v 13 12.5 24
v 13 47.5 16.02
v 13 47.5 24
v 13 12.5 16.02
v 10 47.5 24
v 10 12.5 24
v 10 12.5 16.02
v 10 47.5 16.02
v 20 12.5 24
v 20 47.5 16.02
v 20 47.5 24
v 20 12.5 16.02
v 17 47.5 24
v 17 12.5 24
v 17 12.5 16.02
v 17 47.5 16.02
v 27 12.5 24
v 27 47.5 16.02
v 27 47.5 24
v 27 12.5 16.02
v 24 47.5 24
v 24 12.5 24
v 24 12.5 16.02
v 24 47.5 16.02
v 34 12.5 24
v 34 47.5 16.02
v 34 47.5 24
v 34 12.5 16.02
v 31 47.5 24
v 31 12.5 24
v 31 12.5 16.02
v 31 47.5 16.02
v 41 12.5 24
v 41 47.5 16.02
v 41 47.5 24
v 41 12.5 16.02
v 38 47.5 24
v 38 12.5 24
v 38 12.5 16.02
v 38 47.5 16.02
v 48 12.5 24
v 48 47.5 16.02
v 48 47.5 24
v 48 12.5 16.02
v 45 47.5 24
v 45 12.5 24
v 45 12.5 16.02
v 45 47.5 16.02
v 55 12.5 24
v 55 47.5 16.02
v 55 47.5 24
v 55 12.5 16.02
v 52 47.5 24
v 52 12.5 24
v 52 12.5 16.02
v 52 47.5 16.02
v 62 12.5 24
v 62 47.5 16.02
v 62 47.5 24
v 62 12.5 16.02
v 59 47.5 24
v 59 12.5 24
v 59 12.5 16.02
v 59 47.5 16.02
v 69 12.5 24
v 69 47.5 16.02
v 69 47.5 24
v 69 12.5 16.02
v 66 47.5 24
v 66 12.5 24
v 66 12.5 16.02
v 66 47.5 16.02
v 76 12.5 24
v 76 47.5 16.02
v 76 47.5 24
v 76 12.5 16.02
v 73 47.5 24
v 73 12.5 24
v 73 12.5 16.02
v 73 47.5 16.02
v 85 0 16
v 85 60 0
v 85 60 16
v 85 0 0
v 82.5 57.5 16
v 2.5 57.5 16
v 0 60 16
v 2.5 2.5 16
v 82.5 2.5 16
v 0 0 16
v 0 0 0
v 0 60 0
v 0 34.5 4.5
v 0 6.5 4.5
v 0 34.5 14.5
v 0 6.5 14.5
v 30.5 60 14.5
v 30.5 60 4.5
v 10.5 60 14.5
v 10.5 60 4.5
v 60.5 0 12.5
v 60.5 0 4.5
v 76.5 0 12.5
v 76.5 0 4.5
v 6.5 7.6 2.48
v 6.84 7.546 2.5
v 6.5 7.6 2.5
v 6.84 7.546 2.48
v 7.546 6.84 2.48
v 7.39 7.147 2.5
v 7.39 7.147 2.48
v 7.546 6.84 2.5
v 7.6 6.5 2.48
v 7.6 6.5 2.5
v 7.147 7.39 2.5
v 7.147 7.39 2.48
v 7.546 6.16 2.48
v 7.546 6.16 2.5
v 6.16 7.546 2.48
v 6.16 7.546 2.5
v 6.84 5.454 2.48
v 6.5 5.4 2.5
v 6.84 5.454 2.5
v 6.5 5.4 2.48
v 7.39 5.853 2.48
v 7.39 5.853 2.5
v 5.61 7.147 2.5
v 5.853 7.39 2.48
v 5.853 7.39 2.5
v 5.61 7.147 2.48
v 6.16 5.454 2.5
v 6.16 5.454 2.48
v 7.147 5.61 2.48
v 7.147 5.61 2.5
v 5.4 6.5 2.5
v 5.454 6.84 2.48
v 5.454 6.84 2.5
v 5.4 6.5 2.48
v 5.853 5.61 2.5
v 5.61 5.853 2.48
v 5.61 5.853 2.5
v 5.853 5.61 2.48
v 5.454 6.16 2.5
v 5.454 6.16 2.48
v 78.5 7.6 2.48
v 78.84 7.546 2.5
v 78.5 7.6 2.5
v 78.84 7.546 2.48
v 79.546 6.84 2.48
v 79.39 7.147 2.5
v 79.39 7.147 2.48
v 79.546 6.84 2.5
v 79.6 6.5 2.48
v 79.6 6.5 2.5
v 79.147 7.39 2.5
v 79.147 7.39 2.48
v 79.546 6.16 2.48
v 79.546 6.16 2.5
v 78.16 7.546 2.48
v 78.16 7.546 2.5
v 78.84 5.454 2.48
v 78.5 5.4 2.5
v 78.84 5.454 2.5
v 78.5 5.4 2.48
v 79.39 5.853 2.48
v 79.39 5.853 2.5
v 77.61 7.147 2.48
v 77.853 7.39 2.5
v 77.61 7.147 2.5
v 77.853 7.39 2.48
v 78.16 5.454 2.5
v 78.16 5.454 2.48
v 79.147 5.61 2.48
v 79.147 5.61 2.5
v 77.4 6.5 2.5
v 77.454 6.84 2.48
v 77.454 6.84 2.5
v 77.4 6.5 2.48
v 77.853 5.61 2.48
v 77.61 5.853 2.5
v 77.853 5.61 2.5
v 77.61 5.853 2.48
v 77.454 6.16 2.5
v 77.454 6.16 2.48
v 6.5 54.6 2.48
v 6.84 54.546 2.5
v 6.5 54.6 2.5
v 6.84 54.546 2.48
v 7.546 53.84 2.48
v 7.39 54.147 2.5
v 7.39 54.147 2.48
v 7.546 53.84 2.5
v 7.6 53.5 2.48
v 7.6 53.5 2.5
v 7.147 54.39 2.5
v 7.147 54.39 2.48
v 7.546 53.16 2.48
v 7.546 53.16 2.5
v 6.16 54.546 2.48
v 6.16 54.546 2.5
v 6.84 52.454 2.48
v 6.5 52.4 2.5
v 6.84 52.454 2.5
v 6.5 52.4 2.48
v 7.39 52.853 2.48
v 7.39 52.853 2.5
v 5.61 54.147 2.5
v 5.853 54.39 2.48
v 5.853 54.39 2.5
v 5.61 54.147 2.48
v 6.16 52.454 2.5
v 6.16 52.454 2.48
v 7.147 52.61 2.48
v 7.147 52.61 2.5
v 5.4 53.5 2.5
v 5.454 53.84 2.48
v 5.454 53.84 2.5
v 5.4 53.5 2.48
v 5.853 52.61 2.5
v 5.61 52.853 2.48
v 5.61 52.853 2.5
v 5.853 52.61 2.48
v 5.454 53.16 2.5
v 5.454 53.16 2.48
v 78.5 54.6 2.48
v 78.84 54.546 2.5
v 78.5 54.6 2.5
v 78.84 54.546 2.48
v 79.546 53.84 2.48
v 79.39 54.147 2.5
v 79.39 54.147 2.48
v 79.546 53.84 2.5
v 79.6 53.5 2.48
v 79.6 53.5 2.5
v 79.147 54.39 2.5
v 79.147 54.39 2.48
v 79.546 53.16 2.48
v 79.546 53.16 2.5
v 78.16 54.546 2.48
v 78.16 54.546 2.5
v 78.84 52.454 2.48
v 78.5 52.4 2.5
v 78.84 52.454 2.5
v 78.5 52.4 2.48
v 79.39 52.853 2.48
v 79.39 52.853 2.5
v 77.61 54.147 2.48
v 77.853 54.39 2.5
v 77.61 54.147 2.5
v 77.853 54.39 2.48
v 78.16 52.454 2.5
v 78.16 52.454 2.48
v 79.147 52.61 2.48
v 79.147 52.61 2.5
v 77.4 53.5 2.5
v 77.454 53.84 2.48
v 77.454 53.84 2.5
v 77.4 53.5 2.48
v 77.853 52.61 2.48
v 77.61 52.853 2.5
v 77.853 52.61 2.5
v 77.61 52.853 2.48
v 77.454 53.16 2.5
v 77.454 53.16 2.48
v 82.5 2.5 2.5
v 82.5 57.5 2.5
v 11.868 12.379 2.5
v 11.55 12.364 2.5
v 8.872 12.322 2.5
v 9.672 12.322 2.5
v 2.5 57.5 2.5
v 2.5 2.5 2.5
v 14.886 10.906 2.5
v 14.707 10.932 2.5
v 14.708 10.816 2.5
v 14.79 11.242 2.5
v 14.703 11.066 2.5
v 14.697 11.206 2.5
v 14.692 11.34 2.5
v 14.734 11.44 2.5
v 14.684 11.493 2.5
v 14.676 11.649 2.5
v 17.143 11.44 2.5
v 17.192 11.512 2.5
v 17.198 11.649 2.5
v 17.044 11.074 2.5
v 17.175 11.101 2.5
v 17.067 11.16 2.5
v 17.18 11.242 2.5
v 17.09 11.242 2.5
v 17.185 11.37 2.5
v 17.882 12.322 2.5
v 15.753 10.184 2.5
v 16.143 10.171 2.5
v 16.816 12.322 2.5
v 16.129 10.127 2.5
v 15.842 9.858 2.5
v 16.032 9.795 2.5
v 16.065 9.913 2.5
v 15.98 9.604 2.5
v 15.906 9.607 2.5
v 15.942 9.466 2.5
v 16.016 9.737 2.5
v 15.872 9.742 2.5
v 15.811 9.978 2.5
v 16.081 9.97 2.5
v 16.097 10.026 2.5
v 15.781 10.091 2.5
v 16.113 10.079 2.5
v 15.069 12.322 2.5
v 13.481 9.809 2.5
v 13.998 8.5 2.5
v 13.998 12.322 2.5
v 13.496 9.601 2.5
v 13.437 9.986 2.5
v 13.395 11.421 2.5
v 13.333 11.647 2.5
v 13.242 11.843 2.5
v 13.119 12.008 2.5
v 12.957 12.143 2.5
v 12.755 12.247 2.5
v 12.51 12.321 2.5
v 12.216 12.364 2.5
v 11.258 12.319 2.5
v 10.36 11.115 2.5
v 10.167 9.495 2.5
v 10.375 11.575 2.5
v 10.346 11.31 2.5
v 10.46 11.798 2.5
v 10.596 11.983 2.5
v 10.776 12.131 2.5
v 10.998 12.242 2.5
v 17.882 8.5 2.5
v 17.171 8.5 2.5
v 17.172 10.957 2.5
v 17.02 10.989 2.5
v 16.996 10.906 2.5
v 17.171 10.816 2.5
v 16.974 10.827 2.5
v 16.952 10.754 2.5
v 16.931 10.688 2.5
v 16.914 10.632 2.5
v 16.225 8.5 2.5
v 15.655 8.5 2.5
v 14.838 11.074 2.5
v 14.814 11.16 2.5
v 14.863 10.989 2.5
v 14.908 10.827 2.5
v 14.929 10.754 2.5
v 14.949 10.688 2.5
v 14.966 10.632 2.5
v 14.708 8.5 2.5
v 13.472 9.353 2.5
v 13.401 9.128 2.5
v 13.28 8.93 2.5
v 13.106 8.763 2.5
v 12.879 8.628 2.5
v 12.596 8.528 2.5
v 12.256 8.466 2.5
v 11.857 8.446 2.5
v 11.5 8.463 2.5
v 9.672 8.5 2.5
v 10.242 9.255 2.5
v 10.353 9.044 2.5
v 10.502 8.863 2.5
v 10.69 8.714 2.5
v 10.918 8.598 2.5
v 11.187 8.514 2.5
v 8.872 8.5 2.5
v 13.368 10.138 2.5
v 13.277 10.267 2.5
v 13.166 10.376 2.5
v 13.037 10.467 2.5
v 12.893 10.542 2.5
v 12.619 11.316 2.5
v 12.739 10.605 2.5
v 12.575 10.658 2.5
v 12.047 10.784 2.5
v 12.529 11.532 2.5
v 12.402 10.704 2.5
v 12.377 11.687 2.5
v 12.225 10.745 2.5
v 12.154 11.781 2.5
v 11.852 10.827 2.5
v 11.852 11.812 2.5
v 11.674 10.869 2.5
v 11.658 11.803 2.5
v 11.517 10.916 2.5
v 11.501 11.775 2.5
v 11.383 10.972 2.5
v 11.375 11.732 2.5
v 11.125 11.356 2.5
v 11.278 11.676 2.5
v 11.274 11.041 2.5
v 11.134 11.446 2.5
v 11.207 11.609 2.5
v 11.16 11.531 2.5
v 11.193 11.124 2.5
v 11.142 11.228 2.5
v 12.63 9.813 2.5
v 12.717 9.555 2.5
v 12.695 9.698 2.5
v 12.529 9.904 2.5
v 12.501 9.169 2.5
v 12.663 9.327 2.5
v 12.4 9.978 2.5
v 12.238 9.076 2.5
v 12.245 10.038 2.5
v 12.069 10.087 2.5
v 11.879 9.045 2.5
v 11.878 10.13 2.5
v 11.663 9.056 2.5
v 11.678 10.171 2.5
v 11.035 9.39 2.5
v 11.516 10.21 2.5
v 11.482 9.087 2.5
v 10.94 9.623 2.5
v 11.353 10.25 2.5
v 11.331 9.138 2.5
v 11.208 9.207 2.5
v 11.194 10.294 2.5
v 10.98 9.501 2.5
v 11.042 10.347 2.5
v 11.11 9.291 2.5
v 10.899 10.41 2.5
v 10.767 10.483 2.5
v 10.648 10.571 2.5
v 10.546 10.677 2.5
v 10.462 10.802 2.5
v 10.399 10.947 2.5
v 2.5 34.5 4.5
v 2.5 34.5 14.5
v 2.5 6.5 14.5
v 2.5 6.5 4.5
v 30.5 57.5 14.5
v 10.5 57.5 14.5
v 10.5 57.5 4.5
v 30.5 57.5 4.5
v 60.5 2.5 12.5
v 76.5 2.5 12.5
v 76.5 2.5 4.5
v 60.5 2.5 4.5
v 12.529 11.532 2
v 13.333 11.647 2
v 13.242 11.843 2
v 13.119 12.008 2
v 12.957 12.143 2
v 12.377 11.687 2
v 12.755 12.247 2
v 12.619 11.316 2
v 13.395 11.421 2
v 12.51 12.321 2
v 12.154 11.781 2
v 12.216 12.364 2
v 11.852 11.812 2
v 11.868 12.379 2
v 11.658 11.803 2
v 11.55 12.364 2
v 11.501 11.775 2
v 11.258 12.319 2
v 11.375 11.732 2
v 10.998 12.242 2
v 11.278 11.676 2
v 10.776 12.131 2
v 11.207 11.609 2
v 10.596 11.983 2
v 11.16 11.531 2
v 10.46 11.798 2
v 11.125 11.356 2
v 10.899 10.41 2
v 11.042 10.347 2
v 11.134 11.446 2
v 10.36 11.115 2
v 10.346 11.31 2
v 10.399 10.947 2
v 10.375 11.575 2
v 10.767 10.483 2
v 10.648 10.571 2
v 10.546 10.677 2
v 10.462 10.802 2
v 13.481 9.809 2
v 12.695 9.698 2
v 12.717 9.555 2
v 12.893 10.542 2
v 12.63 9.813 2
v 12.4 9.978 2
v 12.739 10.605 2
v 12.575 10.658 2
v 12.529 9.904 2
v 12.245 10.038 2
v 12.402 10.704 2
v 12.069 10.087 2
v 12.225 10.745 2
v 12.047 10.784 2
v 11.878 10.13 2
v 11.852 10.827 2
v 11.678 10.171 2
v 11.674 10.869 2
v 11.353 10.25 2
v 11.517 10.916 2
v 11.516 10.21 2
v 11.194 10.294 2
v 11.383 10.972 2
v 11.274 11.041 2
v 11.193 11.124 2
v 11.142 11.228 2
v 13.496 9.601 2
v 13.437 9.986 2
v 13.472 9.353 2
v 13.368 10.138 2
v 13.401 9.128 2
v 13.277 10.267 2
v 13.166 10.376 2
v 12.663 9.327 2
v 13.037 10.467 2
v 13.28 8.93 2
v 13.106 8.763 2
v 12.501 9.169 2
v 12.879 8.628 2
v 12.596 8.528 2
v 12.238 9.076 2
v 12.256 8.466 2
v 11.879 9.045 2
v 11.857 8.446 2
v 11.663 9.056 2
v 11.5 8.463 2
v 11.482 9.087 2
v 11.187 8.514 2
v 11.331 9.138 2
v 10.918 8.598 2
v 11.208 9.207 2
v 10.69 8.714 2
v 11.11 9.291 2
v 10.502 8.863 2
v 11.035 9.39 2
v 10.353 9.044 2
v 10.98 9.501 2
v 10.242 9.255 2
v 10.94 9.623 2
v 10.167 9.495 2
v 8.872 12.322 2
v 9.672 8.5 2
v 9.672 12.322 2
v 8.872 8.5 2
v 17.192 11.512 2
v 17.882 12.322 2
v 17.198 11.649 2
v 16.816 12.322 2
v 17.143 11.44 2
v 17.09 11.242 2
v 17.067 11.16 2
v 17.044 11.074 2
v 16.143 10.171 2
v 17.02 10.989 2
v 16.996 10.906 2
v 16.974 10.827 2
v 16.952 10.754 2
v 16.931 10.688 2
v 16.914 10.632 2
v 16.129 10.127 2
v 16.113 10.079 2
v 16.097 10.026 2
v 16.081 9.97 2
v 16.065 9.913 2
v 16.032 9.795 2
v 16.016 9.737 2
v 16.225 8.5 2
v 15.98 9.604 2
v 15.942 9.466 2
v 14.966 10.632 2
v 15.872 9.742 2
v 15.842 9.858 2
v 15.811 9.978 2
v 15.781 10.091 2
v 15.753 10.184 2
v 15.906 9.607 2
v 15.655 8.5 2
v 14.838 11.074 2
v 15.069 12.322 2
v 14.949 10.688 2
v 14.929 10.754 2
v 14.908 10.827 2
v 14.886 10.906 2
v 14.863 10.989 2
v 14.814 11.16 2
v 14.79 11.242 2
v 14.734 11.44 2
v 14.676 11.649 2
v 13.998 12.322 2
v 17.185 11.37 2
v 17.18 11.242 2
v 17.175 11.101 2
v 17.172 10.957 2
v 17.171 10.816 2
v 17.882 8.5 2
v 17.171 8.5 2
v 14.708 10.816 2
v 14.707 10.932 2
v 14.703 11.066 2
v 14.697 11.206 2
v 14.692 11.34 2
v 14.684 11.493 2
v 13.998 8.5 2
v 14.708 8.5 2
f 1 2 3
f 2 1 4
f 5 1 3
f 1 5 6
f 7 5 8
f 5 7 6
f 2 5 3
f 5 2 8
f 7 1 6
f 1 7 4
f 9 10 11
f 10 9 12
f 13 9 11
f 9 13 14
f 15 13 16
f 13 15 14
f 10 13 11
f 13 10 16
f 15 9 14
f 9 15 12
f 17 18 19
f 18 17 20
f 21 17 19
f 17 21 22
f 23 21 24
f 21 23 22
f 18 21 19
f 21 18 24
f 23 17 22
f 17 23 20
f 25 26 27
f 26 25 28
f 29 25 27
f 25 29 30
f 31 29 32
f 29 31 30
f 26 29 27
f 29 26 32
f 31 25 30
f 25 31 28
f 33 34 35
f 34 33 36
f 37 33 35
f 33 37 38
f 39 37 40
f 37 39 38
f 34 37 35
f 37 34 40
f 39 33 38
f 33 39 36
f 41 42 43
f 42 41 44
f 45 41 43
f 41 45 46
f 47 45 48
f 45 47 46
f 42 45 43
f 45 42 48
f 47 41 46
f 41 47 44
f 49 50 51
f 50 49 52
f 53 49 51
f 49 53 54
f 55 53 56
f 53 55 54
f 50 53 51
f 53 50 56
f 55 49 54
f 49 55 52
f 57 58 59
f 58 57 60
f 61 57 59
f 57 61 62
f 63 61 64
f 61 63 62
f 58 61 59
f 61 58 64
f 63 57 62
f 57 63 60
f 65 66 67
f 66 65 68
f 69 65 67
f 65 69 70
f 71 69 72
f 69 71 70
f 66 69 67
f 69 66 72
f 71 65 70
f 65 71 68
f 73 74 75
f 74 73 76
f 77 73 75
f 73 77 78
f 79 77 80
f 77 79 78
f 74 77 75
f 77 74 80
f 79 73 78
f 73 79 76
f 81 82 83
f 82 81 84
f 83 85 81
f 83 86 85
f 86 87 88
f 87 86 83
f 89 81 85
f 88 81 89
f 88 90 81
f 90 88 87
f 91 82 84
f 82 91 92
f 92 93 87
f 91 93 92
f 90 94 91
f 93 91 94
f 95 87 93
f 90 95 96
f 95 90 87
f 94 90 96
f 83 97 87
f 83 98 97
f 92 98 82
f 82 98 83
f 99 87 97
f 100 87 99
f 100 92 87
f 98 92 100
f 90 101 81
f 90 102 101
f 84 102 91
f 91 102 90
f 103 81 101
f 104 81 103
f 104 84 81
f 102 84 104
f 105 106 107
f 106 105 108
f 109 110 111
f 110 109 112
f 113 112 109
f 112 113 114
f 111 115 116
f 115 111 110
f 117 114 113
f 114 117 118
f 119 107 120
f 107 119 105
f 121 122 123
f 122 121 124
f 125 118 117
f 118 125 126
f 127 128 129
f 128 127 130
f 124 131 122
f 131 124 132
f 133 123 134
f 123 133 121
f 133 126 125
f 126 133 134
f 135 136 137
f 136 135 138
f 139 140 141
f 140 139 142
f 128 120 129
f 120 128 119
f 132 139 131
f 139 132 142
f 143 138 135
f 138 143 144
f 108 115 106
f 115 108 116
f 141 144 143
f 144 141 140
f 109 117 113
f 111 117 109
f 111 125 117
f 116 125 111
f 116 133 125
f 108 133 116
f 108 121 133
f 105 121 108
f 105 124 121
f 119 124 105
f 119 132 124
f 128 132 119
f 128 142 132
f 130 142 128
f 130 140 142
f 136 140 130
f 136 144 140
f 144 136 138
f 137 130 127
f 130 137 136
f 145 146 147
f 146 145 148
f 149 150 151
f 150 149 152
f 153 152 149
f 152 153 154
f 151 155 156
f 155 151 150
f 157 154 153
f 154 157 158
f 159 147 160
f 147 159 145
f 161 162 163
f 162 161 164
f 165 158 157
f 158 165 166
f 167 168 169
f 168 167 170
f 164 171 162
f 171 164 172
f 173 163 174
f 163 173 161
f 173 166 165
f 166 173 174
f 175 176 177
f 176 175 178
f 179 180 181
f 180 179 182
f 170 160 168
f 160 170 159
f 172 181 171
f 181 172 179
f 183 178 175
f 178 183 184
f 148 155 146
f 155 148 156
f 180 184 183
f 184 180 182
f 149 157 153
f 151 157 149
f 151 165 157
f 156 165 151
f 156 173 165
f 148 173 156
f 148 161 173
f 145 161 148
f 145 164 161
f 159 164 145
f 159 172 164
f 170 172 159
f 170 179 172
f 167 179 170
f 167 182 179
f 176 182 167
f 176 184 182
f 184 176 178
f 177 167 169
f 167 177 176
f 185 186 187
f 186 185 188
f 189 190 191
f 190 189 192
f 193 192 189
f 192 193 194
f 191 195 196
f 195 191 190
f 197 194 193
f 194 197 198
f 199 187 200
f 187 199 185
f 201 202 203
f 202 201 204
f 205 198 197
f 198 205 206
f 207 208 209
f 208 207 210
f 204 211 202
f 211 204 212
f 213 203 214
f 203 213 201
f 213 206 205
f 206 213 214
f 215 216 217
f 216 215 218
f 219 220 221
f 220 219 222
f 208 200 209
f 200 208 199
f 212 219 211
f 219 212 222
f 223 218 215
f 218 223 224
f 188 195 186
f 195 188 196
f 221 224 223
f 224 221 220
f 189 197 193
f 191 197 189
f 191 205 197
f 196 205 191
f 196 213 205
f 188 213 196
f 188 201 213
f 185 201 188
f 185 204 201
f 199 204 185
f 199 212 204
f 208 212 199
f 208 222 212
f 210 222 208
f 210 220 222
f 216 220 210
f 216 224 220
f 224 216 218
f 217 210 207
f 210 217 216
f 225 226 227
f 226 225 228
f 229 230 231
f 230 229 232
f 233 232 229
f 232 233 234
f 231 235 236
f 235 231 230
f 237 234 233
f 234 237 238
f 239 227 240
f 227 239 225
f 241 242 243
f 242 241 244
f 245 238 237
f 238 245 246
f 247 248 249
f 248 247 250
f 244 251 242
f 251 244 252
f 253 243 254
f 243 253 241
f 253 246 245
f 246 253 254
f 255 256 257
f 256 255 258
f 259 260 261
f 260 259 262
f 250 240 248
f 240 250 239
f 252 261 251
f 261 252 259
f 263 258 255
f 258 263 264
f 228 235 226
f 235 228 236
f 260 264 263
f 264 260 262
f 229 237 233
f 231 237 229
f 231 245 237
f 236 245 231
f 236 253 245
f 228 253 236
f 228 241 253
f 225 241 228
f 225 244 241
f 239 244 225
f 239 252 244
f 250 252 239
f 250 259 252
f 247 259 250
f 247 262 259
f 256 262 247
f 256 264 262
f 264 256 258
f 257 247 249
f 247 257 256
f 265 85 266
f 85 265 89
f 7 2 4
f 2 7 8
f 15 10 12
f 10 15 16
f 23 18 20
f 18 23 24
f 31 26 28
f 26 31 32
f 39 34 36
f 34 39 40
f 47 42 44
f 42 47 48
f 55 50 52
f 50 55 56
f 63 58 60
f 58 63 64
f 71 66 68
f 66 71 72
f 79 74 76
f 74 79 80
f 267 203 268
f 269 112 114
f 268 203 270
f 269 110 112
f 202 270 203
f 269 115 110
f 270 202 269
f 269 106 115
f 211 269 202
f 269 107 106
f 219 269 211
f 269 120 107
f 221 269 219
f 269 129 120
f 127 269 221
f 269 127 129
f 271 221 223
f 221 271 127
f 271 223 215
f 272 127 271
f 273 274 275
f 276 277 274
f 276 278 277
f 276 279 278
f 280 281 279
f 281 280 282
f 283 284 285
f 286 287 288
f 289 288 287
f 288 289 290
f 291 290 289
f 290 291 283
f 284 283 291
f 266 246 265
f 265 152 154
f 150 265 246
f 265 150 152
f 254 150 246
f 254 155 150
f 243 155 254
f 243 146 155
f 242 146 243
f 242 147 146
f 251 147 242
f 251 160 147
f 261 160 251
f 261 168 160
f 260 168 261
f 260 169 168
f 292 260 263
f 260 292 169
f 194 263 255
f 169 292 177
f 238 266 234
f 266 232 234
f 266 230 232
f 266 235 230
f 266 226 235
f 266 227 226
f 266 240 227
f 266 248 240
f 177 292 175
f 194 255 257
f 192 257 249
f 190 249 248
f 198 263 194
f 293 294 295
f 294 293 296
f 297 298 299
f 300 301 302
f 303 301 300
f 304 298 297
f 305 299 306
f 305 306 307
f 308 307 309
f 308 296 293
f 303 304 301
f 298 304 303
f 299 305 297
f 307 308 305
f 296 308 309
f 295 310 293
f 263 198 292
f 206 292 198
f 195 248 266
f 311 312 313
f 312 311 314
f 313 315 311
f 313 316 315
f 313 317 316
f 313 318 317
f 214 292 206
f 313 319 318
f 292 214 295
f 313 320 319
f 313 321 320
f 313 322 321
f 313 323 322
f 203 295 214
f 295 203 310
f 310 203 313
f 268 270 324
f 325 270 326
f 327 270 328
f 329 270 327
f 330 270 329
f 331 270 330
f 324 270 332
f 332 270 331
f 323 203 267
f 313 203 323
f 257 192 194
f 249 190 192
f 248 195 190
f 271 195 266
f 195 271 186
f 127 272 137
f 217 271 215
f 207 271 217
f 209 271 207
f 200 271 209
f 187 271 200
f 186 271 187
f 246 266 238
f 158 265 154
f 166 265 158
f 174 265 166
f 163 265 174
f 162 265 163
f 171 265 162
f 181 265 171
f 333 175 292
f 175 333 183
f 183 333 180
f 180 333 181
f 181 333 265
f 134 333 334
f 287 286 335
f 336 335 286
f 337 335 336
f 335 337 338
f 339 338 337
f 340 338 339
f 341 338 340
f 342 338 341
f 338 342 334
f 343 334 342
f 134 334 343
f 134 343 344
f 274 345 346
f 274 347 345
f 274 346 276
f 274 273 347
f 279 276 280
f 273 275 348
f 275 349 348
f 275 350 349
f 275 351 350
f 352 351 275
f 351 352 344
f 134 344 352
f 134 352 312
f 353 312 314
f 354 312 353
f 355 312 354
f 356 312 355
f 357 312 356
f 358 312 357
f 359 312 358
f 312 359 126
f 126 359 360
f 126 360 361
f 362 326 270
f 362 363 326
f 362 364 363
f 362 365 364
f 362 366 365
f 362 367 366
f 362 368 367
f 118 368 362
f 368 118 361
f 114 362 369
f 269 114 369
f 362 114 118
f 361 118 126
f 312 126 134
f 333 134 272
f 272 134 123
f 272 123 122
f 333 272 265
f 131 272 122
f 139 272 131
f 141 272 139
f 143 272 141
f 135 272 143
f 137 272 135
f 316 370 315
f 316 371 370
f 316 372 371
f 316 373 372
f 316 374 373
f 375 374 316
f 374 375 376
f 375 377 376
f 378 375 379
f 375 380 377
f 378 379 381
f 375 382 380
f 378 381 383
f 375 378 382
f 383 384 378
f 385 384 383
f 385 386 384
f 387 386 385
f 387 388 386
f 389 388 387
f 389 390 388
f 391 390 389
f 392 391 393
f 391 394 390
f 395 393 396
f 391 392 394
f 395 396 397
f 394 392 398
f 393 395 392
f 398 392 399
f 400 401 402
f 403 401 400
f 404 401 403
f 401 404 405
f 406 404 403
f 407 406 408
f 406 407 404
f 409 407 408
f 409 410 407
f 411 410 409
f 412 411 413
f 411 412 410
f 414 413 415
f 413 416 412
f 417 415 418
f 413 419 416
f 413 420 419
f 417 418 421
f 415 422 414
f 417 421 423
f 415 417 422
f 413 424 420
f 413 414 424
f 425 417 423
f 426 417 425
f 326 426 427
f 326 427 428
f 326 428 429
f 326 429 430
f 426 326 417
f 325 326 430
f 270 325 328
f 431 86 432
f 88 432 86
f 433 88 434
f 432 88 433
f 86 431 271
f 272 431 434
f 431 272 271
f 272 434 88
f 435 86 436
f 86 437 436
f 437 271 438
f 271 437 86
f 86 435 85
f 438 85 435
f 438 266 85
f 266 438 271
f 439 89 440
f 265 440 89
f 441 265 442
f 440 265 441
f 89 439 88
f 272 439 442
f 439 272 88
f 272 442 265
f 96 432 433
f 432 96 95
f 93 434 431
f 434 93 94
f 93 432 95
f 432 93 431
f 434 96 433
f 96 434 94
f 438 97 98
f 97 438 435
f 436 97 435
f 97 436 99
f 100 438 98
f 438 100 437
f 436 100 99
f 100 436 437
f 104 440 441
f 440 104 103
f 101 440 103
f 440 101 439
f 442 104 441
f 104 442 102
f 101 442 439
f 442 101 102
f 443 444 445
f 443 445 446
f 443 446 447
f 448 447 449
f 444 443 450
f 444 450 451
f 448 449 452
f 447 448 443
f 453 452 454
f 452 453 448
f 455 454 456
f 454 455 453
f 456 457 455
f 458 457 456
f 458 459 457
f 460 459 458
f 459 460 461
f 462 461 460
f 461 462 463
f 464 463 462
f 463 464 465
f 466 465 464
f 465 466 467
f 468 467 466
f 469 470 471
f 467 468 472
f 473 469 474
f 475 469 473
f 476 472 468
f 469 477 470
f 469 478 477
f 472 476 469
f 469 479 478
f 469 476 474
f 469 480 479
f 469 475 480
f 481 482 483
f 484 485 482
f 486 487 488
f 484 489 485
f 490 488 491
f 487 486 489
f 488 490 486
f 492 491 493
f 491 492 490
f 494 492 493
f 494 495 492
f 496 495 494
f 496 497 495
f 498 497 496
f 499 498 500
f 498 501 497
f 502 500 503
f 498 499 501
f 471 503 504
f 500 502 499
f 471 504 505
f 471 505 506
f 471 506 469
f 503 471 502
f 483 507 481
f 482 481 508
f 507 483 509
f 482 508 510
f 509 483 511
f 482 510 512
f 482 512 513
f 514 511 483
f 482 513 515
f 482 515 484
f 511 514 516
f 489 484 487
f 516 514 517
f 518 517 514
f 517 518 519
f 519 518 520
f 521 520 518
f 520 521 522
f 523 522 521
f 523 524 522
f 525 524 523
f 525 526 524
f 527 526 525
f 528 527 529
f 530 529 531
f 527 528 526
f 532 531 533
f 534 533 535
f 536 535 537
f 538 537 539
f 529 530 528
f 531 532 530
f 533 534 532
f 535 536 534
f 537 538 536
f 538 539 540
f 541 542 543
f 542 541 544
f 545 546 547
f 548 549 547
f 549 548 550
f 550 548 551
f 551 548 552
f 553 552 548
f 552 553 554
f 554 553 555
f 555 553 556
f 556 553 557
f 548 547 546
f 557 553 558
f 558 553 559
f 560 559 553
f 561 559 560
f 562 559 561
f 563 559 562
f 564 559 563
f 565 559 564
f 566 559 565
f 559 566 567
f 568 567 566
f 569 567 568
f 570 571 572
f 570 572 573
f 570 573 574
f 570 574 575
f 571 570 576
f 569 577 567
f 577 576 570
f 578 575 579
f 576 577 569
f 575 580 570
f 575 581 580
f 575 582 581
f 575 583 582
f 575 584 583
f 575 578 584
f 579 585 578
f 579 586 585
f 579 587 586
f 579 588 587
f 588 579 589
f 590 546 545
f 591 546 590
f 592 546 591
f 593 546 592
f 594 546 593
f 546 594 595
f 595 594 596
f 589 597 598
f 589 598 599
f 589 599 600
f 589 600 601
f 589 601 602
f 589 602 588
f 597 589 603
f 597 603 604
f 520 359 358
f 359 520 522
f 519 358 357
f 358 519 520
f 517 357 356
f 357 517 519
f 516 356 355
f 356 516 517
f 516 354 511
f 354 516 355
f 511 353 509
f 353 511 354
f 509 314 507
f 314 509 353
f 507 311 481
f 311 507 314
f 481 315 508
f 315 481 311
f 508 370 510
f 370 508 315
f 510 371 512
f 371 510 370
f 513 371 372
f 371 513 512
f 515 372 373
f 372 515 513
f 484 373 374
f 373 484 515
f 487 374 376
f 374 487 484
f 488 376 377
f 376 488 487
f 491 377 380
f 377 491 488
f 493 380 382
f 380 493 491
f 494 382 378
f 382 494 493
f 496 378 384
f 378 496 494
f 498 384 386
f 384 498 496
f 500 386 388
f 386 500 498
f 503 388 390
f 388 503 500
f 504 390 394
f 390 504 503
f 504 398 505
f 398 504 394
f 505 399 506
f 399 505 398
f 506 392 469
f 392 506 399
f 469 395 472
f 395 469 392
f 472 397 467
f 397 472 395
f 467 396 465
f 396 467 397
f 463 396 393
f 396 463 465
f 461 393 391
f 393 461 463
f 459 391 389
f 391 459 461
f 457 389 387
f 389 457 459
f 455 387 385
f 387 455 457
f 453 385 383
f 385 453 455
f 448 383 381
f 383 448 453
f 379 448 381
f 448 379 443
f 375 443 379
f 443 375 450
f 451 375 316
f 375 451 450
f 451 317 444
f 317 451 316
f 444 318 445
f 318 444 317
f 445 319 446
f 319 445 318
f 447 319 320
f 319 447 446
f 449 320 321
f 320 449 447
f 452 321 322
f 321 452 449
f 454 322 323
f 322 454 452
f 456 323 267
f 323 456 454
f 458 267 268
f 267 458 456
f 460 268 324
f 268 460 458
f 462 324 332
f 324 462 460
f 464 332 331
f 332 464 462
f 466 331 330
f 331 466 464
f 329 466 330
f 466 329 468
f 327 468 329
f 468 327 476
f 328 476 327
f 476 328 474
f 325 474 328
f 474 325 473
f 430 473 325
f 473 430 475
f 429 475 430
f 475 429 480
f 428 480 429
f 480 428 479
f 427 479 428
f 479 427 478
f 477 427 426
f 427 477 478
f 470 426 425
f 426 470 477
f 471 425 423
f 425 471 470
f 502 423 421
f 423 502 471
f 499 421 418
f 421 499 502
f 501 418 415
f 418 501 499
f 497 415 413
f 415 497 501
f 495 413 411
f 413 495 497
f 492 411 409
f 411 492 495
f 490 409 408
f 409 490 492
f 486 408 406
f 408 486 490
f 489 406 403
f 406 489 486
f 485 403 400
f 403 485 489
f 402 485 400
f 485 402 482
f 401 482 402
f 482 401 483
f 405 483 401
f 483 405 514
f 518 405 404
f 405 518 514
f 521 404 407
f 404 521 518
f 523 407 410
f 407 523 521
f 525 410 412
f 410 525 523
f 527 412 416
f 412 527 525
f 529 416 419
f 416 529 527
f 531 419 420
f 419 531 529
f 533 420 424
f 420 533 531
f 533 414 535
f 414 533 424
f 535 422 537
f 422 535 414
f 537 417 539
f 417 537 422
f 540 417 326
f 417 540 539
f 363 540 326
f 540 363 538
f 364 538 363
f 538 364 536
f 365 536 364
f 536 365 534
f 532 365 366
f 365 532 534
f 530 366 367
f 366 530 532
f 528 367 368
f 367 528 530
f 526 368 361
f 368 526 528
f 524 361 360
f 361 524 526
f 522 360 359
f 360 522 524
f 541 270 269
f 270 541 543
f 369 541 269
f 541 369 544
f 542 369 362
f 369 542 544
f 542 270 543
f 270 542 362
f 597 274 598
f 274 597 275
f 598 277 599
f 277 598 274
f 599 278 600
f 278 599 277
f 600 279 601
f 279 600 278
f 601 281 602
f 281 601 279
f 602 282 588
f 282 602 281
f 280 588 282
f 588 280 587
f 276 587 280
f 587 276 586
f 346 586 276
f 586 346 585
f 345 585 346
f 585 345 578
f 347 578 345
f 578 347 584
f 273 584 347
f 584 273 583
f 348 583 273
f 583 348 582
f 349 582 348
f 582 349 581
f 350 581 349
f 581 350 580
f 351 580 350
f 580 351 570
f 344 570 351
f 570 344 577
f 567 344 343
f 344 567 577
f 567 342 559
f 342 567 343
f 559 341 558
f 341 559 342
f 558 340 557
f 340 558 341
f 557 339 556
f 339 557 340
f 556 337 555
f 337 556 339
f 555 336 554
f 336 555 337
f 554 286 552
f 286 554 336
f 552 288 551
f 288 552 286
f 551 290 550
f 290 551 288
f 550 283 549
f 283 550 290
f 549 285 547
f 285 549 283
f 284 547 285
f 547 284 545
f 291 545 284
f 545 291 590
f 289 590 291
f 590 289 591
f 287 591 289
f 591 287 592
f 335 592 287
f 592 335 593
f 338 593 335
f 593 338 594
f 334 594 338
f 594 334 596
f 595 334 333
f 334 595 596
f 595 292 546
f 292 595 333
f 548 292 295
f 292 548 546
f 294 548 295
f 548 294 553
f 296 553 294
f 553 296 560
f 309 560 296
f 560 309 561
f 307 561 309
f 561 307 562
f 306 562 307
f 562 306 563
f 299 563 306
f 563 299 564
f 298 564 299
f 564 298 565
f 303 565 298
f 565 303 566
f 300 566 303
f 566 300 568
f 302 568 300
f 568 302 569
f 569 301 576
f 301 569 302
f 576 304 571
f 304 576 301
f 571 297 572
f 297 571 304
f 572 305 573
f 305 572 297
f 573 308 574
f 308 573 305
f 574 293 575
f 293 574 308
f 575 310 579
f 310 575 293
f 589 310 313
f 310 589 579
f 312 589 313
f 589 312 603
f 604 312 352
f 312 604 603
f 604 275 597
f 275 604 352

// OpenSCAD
// ISM Graphics Card bracket + cooler shroud (original ISM)
// Manifold-safe: bosses unioned into shell, holes cut in one difference().
pcb_w = 80;
pcb_d = 55;
wall = 2.5;
shroud_h = 16;
fin_h = 8;
eps = 0.02;
mount_d = 2.2;
badge_depth = 0.5;

mounts = [[4, 4], [pcb_w - 4, 4], [4, pcb_d - 4], [pcb_w - 4, pcb_d - 4]];

module shroud() {
  difference() {
    union() {
      cube([pcb_w + 2 * wall, pcb_d + 2 * wall, shroud_h]);
      for (x = [10 : 7 : pcb_w - 6])
        translate([x, wall + 10, shroud_h - eps])
          cube([3, pcb_d - 20, fin_h + eps]);
      for (p = mounts)
        translate([p[0] + wall, p[1] + wall, wall - eps])
          cylinder(h = 5 + eps, d = 6, $fn = 24);
    }
    translate([wall, wall, wall])
      cube([pcb_w, pcb_d, shroud_h - wall + eps]);
    // EXP header clearance
    translate([-eps, wall + 4, wall + 2])
      cube([wall + 4, 28, 10]);
    // HDMI cutout
    translate([wall + 8, wall + pcb_d - 2, wall + 2])
      cube([20, wall + 4, 10]);
    // USB-C
    translate([wall + pcb_w - 22, -eps, wall + 2])
      cube([16, wall + 4, 8]);
    for (p = mounts)
      translate([p[0] + wall, p[1] + wall, wall - eps])
        cylinder(h = 8 + 2 * eps, d = mount_d, $fn = 20);
    translate([wall + 6, wall + 6, wall - badge_depth])
      linear_extrude(height = badge_depth + eps)
        text("ISM", size = 4, font = "Liberation Sans:style=Bold");
  }
}

module slot_bracket() {
  // PCIe-style full-height bracket stand-in
  bw = 20;
  bh = 120;
  bt = 1.2;
  difference() {
    cube([bw, bt, bh]);
    translate([4, -eps, 20])
      cube([12, bt + 2 * eps, 18]);
    for (z = [8, bh - 8])
      translate([bw / 2, -eps, z])
        rotate([-90, 0, 0])
          cylinder(h = bt + 2 * eps, d = 3.2, $fn = 20);
  }
}

shroud();
